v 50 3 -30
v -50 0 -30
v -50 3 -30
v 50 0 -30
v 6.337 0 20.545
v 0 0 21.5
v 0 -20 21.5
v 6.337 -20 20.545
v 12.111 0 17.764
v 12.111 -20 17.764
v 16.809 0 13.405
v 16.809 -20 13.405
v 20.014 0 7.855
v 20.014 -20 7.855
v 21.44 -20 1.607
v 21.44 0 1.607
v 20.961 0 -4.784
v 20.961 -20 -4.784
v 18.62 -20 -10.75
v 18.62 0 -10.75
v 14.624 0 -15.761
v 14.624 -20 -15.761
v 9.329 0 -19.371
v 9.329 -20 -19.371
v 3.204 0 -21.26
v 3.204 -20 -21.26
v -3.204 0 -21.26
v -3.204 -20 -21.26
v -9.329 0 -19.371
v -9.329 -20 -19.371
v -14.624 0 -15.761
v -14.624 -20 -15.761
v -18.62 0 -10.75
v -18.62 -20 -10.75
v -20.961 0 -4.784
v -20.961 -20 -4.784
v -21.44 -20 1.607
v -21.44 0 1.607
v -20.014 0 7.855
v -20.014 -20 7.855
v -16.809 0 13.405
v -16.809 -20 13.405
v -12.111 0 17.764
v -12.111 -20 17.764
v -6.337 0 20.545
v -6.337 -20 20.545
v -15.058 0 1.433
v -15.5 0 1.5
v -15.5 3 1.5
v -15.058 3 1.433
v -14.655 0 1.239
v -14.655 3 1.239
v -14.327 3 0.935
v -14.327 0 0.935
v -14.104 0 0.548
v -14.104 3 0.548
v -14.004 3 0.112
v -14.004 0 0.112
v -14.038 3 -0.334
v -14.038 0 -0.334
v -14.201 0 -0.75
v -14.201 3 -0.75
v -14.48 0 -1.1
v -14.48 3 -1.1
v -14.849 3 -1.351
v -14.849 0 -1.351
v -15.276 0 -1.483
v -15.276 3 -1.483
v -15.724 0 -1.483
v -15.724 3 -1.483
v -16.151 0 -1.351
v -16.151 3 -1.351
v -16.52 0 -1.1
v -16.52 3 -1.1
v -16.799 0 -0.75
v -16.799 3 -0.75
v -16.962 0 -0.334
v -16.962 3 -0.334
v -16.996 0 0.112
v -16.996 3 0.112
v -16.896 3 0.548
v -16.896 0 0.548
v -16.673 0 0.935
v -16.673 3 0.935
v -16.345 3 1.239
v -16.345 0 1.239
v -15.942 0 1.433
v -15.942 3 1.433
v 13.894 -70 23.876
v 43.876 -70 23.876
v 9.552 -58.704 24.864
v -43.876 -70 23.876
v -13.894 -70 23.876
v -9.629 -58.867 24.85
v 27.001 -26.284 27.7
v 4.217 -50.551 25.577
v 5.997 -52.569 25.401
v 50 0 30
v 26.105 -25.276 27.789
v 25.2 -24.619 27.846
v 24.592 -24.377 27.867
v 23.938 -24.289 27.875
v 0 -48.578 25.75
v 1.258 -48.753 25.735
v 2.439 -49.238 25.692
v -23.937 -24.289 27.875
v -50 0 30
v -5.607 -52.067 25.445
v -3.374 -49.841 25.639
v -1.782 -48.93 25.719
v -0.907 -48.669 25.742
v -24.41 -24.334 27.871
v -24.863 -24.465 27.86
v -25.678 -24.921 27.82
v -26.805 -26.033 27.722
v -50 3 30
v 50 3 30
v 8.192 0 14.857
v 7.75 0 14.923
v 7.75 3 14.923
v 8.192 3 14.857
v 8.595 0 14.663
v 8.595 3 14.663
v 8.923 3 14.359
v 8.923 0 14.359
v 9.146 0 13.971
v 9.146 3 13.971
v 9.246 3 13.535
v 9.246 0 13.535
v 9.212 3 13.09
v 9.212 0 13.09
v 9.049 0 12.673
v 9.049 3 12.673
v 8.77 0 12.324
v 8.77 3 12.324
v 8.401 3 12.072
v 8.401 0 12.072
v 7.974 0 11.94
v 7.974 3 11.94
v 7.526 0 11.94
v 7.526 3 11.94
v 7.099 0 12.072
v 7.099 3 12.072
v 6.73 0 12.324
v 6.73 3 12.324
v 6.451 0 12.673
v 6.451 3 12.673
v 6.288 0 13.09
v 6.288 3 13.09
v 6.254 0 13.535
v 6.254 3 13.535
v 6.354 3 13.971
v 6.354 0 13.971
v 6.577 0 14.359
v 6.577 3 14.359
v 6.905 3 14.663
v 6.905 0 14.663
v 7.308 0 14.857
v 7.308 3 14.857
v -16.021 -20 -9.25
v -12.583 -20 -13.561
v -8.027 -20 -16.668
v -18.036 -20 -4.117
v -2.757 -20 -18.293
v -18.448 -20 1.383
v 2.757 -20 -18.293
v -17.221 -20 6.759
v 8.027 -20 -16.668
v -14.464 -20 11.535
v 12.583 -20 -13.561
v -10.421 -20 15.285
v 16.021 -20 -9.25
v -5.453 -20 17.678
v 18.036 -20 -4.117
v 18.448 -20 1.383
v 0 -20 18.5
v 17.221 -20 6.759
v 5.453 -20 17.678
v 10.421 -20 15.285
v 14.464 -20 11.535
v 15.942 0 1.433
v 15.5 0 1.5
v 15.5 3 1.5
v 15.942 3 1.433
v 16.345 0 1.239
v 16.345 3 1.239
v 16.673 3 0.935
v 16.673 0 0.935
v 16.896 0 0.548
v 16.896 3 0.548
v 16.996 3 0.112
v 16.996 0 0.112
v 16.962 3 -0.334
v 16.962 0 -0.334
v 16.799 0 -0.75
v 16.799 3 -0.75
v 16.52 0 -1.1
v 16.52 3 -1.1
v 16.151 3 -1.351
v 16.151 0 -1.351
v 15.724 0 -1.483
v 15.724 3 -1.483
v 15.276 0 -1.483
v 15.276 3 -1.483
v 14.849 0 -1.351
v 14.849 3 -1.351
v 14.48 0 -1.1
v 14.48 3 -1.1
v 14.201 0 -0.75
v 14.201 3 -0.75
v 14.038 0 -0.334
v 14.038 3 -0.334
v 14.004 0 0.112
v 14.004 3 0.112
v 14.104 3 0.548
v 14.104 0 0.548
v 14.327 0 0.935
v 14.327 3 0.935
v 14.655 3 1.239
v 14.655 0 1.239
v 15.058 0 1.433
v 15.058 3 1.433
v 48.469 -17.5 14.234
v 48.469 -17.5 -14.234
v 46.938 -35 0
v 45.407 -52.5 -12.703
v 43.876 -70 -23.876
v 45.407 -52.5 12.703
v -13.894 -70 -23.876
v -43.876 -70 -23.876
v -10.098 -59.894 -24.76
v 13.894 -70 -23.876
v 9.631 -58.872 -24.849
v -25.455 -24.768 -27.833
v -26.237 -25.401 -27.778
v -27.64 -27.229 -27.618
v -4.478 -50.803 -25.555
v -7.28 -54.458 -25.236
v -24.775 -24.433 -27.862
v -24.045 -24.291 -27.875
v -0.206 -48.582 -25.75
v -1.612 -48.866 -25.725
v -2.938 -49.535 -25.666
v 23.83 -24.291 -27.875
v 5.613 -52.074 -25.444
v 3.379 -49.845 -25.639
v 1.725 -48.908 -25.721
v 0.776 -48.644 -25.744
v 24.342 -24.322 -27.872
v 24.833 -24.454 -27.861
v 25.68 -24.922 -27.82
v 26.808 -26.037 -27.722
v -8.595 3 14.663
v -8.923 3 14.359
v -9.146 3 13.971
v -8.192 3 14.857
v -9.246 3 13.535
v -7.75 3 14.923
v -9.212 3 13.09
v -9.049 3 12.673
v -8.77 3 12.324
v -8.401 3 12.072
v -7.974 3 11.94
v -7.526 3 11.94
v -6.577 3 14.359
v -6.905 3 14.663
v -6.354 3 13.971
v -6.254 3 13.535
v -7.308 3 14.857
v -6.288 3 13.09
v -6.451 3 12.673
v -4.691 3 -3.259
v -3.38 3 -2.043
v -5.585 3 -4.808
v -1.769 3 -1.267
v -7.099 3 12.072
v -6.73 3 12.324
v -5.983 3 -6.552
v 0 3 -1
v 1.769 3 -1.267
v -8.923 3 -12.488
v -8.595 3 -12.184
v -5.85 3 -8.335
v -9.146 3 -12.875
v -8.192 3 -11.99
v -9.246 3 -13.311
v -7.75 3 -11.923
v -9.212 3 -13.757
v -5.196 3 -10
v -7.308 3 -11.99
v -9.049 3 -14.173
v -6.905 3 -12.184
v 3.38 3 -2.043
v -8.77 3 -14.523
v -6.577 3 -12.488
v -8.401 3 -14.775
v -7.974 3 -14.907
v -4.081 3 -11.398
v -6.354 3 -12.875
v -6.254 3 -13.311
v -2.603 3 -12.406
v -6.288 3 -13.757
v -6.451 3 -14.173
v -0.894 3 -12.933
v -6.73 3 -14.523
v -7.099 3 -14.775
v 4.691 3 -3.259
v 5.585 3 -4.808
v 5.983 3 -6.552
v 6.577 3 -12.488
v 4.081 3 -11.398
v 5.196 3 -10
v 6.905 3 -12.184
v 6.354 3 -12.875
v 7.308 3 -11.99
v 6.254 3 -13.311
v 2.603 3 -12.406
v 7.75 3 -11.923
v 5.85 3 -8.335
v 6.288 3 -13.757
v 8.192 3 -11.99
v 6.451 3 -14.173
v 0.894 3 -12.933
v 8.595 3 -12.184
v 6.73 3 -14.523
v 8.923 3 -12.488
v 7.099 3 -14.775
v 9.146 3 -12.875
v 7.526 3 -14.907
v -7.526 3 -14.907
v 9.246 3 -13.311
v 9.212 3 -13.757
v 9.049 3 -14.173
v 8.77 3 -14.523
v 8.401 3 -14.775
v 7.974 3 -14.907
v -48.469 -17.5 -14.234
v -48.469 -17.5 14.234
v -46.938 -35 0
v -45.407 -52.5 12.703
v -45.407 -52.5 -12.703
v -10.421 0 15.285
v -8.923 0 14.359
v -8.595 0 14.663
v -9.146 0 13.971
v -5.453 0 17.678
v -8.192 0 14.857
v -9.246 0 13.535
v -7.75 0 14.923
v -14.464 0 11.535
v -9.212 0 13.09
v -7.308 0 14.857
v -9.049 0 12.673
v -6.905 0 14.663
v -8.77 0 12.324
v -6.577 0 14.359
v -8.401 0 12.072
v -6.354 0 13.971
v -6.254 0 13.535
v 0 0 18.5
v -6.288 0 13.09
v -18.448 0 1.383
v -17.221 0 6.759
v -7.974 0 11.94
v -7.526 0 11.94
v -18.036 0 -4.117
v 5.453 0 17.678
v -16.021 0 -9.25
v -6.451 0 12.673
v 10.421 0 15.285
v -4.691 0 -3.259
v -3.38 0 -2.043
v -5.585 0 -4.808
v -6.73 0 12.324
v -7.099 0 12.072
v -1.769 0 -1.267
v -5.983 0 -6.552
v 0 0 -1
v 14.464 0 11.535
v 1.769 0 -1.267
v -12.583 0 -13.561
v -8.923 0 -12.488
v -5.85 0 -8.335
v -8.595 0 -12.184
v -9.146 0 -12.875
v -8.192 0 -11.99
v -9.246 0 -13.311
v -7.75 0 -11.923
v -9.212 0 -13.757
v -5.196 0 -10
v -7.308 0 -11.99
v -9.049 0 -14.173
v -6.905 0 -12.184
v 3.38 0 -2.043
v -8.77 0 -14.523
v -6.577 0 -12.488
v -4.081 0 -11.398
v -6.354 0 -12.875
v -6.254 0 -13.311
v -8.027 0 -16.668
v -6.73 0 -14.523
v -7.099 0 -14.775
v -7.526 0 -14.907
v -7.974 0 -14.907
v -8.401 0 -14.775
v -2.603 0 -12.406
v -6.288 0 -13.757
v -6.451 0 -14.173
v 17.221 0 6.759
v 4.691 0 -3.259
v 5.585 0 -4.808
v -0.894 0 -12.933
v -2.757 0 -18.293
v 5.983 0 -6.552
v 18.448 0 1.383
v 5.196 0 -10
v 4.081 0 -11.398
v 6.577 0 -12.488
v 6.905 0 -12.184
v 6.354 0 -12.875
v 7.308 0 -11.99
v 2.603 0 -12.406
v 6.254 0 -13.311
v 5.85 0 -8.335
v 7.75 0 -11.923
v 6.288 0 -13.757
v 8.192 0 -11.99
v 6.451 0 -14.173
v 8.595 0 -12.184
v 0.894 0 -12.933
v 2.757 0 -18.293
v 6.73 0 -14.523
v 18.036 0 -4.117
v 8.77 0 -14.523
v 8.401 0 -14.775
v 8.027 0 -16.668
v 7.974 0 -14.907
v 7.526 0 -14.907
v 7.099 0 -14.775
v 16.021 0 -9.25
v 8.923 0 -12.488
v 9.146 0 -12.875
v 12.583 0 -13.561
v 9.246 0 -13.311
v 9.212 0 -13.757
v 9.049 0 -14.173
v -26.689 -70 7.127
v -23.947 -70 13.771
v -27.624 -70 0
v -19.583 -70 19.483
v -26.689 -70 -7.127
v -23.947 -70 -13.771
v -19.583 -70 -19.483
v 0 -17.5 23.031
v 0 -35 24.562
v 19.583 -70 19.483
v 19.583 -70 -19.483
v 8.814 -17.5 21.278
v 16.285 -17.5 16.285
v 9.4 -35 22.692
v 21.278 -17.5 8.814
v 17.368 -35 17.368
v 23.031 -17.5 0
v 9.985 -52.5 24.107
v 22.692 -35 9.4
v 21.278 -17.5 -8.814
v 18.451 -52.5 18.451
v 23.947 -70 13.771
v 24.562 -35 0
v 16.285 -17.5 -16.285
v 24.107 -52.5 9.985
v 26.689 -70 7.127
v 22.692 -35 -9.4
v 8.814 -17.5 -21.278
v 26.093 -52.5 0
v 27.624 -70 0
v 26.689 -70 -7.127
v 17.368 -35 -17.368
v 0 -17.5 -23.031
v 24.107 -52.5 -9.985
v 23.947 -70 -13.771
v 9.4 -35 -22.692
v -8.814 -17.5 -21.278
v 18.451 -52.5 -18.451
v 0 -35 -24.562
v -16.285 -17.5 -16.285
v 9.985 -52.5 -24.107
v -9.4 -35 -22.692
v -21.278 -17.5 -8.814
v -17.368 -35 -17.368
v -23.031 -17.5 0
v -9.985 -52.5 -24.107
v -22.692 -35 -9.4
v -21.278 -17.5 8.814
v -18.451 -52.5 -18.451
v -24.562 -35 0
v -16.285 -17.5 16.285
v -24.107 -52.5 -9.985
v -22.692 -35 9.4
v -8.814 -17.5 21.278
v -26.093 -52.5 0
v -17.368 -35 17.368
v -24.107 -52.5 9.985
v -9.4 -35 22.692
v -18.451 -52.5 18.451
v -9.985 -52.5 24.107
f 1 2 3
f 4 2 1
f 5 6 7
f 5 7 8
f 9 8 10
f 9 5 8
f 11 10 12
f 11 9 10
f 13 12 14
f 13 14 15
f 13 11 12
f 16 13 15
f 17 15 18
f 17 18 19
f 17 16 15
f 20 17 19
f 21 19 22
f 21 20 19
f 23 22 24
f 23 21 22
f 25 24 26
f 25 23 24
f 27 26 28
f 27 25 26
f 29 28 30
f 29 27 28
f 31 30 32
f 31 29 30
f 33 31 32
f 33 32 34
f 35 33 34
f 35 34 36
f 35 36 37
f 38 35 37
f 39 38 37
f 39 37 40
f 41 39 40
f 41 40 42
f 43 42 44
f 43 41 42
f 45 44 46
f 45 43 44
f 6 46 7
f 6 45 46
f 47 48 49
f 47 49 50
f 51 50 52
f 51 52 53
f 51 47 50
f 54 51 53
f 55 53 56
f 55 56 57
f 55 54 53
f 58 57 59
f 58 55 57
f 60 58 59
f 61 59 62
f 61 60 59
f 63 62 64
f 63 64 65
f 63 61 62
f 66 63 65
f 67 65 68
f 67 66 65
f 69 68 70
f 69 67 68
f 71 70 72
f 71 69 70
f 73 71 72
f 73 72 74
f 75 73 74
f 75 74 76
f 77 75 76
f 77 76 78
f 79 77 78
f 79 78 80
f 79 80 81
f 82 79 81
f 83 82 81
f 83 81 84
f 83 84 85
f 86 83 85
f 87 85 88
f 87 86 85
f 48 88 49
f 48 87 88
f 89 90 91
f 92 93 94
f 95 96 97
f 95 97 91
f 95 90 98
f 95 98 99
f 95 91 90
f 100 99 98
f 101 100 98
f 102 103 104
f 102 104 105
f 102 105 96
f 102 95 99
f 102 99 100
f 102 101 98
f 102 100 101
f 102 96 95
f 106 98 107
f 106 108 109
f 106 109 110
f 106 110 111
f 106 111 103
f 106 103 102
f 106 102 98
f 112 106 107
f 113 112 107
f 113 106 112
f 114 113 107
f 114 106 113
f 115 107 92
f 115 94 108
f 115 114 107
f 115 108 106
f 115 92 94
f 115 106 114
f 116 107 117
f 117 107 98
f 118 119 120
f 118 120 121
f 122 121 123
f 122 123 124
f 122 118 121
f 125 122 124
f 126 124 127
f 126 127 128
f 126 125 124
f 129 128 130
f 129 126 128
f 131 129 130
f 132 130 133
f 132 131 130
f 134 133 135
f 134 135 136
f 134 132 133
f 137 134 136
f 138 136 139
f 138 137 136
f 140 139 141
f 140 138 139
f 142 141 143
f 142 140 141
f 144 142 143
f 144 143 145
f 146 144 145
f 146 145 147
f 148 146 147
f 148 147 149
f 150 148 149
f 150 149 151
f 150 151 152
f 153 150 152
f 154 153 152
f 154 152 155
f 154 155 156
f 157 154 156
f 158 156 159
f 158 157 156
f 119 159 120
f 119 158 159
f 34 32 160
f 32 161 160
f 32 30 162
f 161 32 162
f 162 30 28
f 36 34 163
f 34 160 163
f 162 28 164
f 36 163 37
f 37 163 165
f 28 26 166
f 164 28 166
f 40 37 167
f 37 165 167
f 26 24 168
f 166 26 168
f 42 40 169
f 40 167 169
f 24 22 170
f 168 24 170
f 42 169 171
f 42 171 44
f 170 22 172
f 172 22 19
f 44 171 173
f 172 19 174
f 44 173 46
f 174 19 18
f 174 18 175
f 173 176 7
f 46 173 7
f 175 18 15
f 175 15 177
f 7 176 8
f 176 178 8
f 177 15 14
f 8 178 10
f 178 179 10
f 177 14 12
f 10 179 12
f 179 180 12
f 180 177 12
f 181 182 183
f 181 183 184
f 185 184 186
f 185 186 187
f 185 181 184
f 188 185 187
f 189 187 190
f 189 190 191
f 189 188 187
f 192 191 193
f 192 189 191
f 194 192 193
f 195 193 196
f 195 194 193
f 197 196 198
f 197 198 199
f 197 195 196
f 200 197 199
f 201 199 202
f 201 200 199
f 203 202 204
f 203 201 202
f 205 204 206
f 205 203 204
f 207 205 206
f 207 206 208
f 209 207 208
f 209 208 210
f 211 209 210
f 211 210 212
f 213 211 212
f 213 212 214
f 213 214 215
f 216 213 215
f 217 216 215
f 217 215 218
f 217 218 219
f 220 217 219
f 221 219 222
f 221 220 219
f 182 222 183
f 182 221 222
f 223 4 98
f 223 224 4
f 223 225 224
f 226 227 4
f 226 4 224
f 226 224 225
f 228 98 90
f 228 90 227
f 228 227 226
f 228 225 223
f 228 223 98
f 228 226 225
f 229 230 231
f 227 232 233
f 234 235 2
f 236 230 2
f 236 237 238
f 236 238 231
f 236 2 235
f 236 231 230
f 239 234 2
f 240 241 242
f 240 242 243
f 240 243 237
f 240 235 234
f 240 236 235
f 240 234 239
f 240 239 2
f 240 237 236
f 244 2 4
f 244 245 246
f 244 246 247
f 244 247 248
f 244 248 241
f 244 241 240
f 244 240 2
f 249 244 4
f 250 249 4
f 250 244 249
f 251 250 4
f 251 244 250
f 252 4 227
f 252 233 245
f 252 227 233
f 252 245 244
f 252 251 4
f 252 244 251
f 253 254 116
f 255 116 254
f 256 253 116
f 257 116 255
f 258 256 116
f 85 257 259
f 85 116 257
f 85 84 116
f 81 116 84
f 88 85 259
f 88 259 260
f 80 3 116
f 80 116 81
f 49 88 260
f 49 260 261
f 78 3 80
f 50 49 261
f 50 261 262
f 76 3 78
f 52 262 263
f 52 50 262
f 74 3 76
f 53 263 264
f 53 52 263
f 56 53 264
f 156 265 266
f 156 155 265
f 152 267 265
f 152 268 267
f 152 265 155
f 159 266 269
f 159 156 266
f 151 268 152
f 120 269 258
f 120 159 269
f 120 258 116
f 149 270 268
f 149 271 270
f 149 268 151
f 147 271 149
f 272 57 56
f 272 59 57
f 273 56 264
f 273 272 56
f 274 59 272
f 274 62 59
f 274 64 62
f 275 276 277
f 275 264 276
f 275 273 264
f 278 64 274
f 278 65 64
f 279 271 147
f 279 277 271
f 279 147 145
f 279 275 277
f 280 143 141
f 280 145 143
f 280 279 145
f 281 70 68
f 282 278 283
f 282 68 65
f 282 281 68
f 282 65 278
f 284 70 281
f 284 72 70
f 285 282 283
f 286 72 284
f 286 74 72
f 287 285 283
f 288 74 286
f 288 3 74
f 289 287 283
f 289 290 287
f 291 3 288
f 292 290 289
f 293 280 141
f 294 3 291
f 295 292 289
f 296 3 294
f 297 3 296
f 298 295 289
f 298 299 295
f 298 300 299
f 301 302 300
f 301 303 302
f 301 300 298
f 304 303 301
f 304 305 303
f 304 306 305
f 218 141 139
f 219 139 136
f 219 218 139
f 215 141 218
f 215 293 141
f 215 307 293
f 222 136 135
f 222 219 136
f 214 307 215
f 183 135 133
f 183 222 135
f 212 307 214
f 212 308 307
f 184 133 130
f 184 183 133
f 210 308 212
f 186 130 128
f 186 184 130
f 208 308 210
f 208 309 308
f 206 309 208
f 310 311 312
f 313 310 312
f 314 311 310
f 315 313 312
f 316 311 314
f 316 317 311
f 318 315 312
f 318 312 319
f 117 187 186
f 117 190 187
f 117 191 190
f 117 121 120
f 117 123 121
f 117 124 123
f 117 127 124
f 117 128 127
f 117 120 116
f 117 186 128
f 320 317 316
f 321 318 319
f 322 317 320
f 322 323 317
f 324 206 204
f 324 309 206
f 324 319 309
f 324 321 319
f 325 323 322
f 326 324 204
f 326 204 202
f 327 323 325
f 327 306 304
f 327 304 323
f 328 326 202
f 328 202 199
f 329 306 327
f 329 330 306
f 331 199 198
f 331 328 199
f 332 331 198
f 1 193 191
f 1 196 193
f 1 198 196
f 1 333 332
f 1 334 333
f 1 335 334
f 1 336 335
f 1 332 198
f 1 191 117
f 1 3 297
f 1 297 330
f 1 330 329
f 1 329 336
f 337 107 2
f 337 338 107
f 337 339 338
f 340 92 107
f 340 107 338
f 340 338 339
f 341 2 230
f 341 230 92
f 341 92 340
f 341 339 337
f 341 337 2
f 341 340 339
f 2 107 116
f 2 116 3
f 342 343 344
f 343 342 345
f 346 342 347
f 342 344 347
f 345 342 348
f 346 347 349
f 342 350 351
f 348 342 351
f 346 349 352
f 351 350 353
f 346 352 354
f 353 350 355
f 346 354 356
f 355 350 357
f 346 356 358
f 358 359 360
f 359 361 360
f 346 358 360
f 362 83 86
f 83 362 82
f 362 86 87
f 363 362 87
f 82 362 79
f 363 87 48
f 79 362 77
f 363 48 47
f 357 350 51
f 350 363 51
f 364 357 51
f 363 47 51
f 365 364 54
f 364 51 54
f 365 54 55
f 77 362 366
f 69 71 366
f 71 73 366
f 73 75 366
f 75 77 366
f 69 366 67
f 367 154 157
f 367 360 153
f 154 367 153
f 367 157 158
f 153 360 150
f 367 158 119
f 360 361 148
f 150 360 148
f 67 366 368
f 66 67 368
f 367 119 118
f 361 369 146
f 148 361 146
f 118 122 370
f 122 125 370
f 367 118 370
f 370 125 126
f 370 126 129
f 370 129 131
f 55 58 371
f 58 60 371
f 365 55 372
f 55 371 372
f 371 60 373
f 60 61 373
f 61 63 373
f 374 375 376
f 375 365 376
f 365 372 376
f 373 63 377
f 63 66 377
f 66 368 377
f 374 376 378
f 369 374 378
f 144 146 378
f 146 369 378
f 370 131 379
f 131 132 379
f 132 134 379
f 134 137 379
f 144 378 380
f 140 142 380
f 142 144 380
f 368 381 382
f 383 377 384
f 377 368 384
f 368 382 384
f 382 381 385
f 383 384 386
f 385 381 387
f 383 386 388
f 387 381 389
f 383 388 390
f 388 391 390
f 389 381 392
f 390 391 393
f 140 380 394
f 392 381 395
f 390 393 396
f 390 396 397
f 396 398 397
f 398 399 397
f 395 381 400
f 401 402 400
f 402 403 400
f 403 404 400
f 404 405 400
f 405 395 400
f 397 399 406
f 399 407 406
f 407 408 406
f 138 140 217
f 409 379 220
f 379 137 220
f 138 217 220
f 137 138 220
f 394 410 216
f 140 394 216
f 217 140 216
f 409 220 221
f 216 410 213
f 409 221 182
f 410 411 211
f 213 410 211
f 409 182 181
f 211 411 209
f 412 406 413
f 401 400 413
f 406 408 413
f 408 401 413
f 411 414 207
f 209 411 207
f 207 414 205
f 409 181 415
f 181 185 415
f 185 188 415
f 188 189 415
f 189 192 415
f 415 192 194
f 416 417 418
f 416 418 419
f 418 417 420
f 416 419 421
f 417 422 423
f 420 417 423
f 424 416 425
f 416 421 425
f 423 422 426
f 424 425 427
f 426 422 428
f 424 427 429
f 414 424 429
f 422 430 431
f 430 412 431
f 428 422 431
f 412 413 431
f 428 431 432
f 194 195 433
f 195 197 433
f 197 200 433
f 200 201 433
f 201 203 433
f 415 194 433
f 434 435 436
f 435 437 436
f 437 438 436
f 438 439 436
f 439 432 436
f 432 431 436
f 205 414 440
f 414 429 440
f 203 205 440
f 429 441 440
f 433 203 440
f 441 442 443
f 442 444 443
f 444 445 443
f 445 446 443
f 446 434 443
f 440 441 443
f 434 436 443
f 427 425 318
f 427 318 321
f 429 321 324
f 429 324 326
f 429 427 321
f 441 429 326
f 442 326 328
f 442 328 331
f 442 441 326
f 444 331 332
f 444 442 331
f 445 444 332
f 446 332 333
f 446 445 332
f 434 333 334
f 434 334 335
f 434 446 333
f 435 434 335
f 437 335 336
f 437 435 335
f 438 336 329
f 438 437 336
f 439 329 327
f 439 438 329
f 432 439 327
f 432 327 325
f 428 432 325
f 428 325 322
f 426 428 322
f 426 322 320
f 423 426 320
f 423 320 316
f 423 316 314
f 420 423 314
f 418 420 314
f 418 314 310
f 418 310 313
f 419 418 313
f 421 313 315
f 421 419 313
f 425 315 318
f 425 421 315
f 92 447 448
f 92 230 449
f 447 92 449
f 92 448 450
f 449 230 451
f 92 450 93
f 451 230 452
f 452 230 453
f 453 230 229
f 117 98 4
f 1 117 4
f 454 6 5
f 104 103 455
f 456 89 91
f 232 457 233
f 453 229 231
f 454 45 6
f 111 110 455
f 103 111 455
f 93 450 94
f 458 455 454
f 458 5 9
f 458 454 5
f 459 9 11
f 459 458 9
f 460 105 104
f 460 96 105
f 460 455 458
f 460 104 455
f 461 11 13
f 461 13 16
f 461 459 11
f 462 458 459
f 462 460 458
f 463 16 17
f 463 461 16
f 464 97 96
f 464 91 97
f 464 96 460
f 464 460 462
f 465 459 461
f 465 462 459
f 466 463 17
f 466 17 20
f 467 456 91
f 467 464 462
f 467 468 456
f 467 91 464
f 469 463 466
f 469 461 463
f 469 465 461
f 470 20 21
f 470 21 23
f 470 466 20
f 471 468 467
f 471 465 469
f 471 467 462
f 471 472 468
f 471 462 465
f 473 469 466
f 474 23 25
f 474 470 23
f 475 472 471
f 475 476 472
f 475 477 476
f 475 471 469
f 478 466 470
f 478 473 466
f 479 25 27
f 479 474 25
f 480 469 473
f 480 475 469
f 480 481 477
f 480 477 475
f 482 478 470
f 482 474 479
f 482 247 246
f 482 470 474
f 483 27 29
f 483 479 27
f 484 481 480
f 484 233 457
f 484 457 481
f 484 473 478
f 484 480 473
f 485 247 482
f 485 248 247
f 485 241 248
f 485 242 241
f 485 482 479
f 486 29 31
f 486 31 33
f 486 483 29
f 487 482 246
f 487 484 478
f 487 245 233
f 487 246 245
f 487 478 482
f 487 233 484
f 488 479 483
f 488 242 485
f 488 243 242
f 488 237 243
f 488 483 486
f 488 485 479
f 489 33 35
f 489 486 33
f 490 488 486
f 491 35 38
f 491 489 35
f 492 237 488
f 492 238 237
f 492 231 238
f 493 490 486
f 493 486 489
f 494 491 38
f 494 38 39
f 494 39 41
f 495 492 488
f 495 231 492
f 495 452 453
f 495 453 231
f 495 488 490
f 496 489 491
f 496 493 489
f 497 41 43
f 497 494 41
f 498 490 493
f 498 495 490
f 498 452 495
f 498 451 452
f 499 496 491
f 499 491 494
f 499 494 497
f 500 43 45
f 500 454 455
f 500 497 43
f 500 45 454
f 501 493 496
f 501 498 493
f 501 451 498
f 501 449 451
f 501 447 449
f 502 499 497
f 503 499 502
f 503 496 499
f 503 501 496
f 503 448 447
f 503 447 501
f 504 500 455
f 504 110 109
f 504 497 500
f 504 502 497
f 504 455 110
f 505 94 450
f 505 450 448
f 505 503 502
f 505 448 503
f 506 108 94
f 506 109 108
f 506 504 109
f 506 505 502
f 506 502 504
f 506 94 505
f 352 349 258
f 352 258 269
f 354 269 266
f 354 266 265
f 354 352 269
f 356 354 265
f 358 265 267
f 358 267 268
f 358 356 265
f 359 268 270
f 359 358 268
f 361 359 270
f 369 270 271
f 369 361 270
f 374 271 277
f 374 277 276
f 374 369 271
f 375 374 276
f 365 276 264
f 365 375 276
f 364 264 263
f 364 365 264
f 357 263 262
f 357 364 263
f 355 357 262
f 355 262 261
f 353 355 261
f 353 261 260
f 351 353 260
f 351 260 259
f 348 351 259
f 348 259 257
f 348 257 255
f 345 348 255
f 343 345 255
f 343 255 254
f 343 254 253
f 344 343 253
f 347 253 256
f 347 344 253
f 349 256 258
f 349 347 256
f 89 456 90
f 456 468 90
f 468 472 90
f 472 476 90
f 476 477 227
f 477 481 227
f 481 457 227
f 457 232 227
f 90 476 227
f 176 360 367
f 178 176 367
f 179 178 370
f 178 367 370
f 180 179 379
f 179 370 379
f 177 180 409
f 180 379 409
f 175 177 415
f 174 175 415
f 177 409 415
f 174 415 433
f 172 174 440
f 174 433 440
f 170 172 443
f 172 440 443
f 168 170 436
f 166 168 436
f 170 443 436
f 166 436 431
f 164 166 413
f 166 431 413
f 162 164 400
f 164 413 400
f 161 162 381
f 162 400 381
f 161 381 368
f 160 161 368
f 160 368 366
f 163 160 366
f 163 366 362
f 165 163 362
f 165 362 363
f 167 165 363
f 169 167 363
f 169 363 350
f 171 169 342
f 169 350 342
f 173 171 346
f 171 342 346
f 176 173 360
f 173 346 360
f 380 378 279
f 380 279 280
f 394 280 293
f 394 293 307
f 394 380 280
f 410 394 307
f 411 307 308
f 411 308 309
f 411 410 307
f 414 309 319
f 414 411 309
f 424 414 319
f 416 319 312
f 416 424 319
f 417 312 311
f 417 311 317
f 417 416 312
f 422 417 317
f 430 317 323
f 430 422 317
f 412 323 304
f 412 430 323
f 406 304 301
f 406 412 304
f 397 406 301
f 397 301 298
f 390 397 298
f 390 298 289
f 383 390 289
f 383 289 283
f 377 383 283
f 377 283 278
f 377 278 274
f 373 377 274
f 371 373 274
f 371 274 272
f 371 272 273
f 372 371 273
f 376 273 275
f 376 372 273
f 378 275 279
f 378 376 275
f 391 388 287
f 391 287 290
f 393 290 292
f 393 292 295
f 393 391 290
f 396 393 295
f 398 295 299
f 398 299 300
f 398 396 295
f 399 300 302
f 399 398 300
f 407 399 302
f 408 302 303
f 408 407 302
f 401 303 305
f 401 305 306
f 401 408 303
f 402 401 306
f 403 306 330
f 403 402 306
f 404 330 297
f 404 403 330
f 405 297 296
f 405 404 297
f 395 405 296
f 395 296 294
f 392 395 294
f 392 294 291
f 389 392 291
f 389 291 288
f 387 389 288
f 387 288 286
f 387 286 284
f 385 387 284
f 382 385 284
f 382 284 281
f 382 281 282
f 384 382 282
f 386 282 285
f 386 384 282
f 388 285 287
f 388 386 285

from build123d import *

# Parameters (mm, degrees)
CROQUIS1_W              = 100
CROQUIS1_H              = 60
CROQUIS1_R              = 6
CROQUIS1_R_2            = 1.5
SALIENTE_EXTRUIR1_DEPTH = 3
CROQUIS2_R              = 21.5
CROQUIS2_R_2            = 18.5
SALIENTE_EXTRUIR2_DEPTH = 20
CROQUIS4_W              = 100
CROQUIS4_H              = 60
CROQUIS4_R              = 21.5
SALIENTE_EXTRUIR3_DEPTH = 70
SALIENTE_EXTRUIR3_TAPER = 5


with BuildPart() as part:
    # Croquis1 → Saliente-Extruir1 (new body)
    with BuildSketch(Plane(origin=(0, 0, 0), x_dir=(1, 0, 0), z_dir=(0, 1, 0))):
        Rectangle(CROQUIS1_W, CROQUIS1_H)
        with Locations(Location((0, 7, 0), (0, 0, 270))):
            Circle(CROQUIS1_R, mode=Mode.SUBTRACT)
        with Locations(Location((15.5, 0, 0), (0, 0, 270))):
            Circle(CROQUIS1_R_2, mode=Mode.SUBTRACT)
        with Locations(Location((7.75, -13.423393759, 0), (0, 0, 270))):
            Circle(CROQUIS1_R_2, mode=Mode.SUBTRACT)
        with Locations(Location((-7.75, -13.423393759, 0), (0, 0, 270))):
            Circle(CROQUIS1_R_2, mode=Mode.SUBTRACT)
        with Locations(Location((-15.5, 0, 0), (0, 0, 270))):
            Circle(CROQUIS1_R_2, mode=Mode.SUBTRACT)
        with Locations(Location((-7.75, 13.423393759, 0), (0, 0, 270))):
            Circle(CROQUIS1_R_2, mode=Mode.SUBTRACT)
        with Locations(Location((7.75, 13.423393759, 0), (0, 0, 270))):
            Circle(CROQUIS1_R_2, mode=Mode.SUBTRACT)
    extrude(amount=SALIENTE_EXTRUIR1_DEPTH)

    # Croquis2 → Saliente-Extruir2 (add)
    with BuildSketch(Plane(origin=(0, 0, 0), x_dir=(1, 0, 0), z_dir=(0, 1, 0))):
        with Locations(Location((0, 0, 0), (0, 0, 270))):
            Circle(CROQUIS2_R)
        with Locations(Location((0, 0, 0), (0, 0, 270))):
            Circle(CROQUIS2_R_2, mode=Mode.SUBTRACT)
    extrude(amount=-SALIENTE_EXTRUIR2_DEPTH)

    # Croquis4 → Saliente-Extruir3 (add)
    with BuildSketch(Plane.XZ):
        Rectangle(CROQUIS4_W, CROQUIS4_H)
        with Locations(Location((0, 0, 0), (0, 0, 90))):
            Circle(CROQUIS4_R, mode=Mode.SUBTRACT)
    extrude(amount=SALIENTE_EXTRUIR3_DEPTH, taper=SALIENTE_EXTRUIR3_TAPER)


solid = part.part
